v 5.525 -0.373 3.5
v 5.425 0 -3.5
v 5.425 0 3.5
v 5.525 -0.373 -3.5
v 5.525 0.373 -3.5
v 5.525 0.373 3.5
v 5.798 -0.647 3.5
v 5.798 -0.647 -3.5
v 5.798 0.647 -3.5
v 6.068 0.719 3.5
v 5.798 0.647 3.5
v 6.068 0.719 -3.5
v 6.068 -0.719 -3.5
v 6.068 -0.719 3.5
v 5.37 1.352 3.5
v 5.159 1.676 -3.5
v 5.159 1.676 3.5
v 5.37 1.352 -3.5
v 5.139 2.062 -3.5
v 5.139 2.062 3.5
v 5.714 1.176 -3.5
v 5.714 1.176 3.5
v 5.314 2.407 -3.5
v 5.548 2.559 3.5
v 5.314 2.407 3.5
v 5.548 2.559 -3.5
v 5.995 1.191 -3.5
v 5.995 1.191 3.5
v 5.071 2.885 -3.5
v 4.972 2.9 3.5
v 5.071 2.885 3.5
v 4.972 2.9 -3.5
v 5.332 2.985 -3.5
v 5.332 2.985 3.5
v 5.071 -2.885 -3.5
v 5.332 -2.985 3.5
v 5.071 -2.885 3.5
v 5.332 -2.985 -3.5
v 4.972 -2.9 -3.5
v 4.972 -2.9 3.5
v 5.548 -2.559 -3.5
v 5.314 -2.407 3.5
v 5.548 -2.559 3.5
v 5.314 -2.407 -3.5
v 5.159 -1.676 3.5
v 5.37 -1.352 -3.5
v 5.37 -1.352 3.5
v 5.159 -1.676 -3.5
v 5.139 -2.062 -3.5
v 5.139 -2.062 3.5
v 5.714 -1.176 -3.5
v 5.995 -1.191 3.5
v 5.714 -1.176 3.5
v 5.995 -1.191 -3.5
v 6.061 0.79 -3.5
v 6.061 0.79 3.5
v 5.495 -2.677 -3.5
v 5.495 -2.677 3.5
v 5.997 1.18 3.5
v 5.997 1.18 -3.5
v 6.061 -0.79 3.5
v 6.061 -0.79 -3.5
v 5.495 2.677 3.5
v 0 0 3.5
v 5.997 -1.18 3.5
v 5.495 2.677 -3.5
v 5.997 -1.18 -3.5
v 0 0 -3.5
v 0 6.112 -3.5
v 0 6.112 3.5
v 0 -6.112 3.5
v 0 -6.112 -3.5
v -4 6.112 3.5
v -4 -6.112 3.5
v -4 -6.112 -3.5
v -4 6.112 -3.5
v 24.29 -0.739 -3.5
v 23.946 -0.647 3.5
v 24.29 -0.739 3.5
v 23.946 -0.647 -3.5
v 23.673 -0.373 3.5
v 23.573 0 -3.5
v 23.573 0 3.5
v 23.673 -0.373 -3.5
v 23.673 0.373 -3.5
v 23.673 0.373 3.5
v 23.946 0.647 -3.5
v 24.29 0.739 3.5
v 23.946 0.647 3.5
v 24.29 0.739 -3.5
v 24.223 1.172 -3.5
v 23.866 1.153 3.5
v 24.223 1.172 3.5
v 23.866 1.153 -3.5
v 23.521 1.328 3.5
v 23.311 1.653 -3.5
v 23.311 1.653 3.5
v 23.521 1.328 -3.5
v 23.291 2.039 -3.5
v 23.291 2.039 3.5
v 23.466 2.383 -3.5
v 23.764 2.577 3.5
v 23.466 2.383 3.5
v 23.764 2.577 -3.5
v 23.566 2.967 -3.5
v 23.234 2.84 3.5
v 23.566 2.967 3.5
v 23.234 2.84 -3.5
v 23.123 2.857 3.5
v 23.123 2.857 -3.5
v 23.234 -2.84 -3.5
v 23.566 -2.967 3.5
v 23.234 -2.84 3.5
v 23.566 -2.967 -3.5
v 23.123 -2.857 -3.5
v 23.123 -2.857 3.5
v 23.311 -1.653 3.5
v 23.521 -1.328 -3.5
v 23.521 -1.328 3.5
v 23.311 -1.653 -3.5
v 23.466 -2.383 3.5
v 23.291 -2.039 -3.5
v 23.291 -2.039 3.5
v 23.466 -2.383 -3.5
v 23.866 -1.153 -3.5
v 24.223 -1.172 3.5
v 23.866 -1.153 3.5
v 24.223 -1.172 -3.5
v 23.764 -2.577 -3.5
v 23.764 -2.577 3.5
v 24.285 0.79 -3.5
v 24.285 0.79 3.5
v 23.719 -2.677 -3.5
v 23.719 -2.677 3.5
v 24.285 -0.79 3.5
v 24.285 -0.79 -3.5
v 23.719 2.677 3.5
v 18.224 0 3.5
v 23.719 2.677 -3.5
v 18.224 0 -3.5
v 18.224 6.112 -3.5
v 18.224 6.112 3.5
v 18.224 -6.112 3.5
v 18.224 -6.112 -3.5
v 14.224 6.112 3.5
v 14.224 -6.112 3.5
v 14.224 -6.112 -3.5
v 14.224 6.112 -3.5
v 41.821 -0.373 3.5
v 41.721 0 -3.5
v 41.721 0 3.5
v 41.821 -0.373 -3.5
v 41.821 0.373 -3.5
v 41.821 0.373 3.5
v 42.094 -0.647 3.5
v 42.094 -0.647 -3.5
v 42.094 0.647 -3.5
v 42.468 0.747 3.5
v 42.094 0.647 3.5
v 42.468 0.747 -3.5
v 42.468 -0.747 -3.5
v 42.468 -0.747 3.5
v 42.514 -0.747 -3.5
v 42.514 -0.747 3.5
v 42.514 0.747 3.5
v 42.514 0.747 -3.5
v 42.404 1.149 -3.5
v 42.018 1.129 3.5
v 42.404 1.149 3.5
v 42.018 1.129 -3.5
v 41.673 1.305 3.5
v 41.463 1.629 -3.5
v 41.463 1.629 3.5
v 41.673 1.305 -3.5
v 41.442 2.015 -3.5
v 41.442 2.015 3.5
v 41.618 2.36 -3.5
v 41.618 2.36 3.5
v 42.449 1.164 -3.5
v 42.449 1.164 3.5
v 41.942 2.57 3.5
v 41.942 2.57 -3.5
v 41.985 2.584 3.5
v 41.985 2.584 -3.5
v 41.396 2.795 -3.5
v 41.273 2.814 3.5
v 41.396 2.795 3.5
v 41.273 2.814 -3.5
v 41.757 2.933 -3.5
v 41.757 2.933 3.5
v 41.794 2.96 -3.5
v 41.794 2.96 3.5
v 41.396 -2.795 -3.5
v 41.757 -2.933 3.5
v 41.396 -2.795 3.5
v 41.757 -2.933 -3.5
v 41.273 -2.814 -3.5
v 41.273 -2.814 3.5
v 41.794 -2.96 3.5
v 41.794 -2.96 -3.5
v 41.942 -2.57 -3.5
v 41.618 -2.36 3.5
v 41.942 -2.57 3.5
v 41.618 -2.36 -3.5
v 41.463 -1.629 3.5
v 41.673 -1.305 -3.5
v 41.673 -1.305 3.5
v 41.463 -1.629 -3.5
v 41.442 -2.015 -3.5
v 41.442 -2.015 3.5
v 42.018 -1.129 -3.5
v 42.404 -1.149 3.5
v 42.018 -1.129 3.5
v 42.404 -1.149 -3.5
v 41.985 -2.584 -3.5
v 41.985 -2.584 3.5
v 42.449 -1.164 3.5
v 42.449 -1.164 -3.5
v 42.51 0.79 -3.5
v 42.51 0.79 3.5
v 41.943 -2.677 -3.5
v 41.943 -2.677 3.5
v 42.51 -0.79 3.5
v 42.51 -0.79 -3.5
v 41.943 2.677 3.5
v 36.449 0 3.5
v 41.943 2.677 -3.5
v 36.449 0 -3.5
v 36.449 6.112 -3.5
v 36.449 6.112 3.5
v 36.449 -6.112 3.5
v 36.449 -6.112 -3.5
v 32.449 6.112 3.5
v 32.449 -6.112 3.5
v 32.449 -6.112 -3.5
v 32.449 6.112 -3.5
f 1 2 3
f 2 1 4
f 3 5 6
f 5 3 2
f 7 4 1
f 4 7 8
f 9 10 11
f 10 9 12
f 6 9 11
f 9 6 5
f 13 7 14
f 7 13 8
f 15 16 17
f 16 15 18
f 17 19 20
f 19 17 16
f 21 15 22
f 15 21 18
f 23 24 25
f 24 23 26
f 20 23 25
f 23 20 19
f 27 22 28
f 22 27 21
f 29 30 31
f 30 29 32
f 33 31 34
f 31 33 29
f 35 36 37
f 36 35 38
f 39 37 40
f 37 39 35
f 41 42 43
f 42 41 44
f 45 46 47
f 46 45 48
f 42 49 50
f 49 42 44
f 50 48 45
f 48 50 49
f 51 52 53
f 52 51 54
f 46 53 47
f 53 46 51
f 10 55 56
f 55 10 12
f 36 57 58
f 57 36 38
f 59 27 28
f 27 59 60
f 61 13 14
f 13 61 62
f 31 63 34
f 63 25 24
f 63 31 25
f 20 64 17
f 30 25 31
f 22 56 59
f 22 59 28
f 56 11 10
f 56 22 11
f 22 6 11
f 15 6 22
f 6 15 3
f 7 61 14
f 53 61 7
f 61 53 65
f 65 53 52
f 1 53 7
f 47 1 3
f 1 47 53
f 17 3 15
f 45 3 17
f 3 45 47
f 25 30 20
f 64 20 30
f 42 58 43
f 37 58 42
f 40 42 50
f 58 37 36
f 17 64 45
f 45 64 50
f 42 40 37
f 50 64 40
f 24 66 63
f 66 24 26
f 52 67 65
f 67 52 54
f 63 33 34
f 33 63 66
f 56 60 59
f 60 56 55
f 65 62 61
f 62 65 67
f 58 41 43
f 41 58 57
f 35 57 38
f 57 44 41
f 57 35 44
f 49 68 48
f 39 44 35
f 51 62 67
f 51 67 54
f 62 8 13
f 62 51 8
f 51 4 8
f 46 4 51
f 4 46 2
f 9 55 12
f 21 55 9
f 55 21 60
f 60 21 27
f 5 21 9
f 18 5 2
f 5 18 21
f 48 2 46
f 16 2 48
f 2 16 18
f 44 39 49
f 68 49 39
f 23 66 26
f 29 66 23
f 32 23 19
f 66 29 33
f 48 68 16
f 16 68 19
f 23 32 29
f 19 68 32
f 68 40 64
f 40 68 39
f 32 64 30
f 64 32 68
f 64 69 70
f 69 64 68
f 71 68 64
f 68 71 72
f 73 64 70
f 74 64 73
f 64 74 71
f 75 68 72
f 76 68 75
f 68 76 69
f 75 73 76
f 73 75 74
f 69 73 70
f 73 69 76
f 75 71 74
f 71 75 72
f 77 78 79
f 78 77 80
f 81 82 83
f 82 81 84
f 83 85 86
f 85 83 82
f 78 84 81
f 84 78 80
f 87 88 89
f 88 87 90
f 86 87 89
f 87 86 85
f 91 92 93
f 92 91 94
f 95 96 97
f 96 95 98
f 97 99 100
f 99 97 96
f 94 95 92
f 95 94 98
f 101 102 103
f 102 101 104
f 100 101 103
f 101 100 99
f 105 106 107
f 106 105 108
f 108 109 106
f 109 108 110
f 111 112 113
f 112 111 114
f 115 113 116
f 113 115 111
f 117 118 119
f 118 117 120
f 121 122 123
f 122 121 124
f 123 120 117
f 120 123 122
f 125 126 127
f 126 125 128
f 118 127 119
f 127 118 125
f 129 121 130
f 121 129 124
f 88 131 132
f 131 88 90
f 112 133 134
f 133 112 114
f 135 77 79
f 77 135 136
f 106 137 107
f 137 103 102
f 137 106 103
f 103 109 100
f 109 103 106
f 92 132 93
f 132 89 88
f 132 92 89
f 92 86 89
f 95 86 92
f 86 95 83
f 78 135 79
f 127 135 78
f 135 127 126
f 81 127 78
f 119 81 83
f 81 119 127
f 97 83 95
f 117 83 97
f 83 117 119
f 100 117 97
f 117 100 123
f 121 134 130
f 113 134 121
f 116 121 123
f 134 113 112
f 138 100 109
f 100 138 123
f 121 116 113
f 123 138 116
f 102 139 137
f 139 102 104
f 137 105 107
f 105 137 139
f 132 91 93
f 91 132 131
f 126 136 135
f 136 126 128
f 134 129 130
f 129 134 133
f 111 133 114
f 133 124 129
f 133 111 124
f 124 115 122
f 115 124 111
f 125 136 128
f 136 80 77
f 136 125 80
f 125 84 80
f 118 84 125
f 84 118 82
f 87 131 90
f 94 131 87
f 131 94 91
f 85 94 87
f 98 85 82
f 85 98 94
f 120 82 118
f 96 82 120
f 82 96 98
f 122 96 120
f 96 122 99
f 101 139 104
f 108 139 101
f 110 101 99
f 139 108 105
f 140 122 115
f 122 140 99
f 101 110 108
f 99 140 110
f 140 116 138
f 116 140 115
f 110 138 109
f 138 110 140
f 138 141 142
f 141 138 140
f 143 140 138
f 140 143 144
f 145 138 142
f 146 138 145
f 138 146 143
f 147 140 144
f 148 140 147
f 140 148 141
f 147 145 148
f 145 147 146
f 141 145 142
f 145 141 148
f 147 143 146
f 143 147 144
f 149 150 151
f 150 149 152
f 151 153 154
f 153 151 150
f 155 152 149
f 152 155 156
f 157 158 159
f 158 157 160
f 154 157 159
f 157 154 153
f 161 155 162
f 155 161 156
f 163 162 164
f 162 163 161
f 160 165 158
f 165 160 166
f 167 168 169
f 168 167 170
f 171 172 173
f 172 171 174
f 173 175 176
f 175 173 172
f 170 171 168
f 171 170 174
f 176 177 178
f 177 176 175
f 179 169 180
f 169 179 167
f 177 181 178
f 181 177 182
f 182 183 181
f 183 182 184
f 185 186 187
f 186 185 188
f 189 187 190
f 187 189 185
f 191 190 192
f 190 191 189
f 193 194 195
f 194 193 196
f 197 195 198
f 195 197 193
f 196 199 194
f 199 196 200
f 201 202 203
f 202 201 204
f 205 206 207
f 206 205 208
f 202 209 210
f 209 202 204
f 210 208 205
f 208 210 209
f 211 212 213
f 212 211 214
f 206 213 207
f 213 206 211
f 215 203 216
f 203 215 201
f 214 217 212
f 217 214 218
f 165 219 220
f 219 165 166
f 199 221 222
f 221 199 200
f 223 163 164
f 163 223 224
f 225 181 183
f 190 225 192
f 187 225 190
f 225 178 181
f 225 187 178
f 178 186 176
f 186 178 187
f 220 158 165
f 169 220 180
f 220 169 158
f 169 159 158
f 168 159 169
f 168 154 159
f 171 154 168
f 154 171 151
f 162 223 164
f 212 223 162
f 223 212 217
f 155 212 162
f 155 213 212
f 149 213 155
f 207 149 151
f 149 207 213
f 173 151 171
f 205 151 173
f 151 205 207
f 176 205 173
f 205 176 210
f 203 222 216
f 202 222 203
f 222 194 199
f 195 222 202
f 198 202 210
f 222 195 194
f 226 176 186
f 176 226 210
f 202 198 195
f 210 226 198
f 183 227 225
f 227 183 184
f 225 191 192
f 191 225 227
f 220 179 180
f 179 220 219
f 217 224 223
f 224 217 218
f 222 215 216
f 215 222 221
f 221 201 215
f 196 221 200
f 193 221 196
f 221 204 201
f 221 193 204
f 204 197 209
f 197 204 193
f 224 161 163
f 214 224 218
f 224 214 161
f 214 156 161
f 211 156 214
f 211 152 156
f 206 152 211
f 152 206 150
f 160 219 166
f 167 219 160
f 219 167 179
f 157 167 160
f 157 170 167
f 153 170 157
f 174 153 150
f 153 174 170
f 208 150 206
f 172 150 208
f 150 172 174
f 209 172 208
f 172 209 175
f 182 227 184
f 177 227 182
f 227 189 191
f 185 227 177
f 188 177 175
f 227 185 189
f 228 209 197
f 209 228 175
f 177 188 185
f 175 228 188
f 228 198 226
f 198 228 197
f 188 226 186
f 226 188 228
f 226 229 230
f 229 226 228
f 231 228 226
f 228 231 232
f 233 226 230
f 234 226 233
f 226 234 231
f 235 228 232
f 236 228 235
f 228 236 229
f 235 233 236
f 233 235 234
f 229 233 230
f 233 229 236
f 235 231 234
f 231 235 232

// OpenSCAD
// file: gt2.scad
// GT2 (2GT) timing pulley generator.
//
// Pitch geometry here is exact and cross-confirmed against the real
// salvaged 20T pulley (EVA-297: pitch dia 12.73, OD 12.22 -> PLD 0.254).
// The tooth FLANK is an approximation of the Gates curvilinear groove --
// see the honesty note in params.scad section 2. gt2_coupon.scad exists
// to settle the flank by print, the same way the microscope build settled
// its M12 thread by print rather than by argument.
//
// use<> imports modules but NOT the includes around them (AGENTS.md /
// cad-design rule 2), so every consumer of this file must include
// params.scad itself. gt2_pulley() asserts on the constants it needs so a
// missing include fails loudly instead of rendering an undef-sized blob.

include <params.scad>

// One groove, as a 2D cross-section in the pulley's OWN XY plane, placed
// so its mouth is at the pulley OD and its floor sits tooth_depth below.
// Round-bottomed slot: a circle at the floor plus a throat out past the OD.
//
// The profile is referenced to the OD, not to the pitch circle, because
// that is how groove depth is specified. The two differ by the 0.254mm
// pitch line differential -- a third of the groove depth, not a rounding
// error.
module gt2_groove_2d(od, depth_scale = 1.0) {
    d     = tooth_depth * depth_scale;
    floor = od / 2 - d + tooth_width / 2;   // centre of the floor arc
    union() {
        translate([floor, 0]) circle(r = tooth_width / 2);
        translate([floor, -tooth_width / 2])
            square([od / 2 - floor + 1, tooth_width]);
    }
}

// A GT2 pulley blank + grooves.
//   teeth  tooth count
//   face   axial width of the belt-bearing face
//   flange true to add belt-retaining flanges on both ends
//   depth_scale multiplier on the (approximate) groove depth -- the knob
//          gt2_coupon.scad sweeps to settle the flank by print
module gt2_pulley(teeth, face = undef, flange = true, depth_scale = 1.0) {
    assert(is_num(belt_pitch) && is_num(belt_pld),
           "gt2.scad: params.scad was not included -- pitch constants are undef");
    assert(is_num(teeth) && teeth >= 10, "gt2_pulley: teeth must be >= 10");

    f  = is_undef(face) ? pulley_face_w : face;
    pd = pulley_pd(teeth);
    od = pulley_od(teeth);

    difference() {
        union() {
            cylinder(h = f, d = od, center = true);
            if (flange)
                for (z = [-1, 1])
                    translate([0, 0, z * (f / 2 + pulley_flange_h / 2)])
                        cylinder(h = pulley_flange_h,
                                 d = od + 2 * pulley_flange_t, center = true);
        }
        // Grooves run PARALLEL TO THE AXIS, the full width of the face.
        //
        // The first attempt rotated the profile 90 degrees and extruded it
        // ACROSS the face instead, which cut slots through the rim rather
        // than teeth around it. The result was watertight, valid, and
        // printable -- and a perfectly smooth wheel that cannot drive a
        // belt. It was invisible on the assembly render at this scale and
        // only showed up on an orthographic view of the coupon. Rule 2:
        // assert on a measurable consequence, which is why check.py counts
        // the teeth rather than trusting that they rendered.
        for (i = [0 : teeth - 1])
            rotate([0, 0, i * 360 / teeth])
                linear_extrude(height = f + 2 * pulley_flange_h + 2,
                               center = true)
                    gt2_groove_2d(od, depth_scale);
    }
}

// Total outside envelope of a pulley including its flanges -- the number
// any clearance check should ask for, rather than re-deriving it.
function gt2_envelope_d(teeth, flange = true) =
    pulley_od(teeth) + (flange ? 2 * pulley_flange_t : 0);
function gt2_envelope_h(face = undef, flange = true) =
    (is_undef(face) ? pulley_face_w : face) + (flange ? 2 * pulley_flange_h : 0);
// main file
// GT2 TOOTH-PROFILE COUPON -- settle the flank by print, not by argument.
//
// params.scad section 2 is explicit that the tooth FLANK here is an
// approximation of the Gates 2GT groove, while the pitch geometry is exact
// and confirmed against the real salvaged pulley. This coupon is how the
// approximation gets tested before 100+ grams of filament goes into a
// 160T wheel.
//
// Same method the microscope build used to settle its M12 thread: print a
// small coupon carrying several candidate variants, offer them to the real
// mating part, and keep whichever actually engages. Reasoning about tooth
// profiles from a datasheet is exactly the kind of "should have worked"
// this repo's history is a list of.
//
// Usage: print, then roll the real salvaged belt onto each arc. The right
// depth seats with no rock and no rattle.

include <params.scad>
use <gt2.scad>

coupon_teeth = 20;   // same tooth count as the real motor pulley, so the
                     // belt sees the same curvature it will in service
variants     = [0.9, 1.0, 1.1];   // multipliers on tooth_depth
gap          = 6;

module coupon() {
    for (i = [0 : len(variants) - 1]) {
        translate([i * (pulley_od(coupon_teeth) + gap), 0, 0]) {
            // A 120-degree arc of pulley is enough to test seating and
            // costs a fraction of a full wheel.
            intersection() {
                gt2_pulley(coupon_teeth, flange = false,
                           depth_scale = variants[i]);
                translate([0, 0, -20])
                    linear_extrude(40)
                        polygon([[0, 0], [60, -35], [60, 35]]);
            }
            // Backing web so the arc is printable standing up.
            translate([-2, 0, 0])
                cube([4, pulley_od(coupon_teeth), pulley_face_w], center = true);
        }
    }
}

coupon();
